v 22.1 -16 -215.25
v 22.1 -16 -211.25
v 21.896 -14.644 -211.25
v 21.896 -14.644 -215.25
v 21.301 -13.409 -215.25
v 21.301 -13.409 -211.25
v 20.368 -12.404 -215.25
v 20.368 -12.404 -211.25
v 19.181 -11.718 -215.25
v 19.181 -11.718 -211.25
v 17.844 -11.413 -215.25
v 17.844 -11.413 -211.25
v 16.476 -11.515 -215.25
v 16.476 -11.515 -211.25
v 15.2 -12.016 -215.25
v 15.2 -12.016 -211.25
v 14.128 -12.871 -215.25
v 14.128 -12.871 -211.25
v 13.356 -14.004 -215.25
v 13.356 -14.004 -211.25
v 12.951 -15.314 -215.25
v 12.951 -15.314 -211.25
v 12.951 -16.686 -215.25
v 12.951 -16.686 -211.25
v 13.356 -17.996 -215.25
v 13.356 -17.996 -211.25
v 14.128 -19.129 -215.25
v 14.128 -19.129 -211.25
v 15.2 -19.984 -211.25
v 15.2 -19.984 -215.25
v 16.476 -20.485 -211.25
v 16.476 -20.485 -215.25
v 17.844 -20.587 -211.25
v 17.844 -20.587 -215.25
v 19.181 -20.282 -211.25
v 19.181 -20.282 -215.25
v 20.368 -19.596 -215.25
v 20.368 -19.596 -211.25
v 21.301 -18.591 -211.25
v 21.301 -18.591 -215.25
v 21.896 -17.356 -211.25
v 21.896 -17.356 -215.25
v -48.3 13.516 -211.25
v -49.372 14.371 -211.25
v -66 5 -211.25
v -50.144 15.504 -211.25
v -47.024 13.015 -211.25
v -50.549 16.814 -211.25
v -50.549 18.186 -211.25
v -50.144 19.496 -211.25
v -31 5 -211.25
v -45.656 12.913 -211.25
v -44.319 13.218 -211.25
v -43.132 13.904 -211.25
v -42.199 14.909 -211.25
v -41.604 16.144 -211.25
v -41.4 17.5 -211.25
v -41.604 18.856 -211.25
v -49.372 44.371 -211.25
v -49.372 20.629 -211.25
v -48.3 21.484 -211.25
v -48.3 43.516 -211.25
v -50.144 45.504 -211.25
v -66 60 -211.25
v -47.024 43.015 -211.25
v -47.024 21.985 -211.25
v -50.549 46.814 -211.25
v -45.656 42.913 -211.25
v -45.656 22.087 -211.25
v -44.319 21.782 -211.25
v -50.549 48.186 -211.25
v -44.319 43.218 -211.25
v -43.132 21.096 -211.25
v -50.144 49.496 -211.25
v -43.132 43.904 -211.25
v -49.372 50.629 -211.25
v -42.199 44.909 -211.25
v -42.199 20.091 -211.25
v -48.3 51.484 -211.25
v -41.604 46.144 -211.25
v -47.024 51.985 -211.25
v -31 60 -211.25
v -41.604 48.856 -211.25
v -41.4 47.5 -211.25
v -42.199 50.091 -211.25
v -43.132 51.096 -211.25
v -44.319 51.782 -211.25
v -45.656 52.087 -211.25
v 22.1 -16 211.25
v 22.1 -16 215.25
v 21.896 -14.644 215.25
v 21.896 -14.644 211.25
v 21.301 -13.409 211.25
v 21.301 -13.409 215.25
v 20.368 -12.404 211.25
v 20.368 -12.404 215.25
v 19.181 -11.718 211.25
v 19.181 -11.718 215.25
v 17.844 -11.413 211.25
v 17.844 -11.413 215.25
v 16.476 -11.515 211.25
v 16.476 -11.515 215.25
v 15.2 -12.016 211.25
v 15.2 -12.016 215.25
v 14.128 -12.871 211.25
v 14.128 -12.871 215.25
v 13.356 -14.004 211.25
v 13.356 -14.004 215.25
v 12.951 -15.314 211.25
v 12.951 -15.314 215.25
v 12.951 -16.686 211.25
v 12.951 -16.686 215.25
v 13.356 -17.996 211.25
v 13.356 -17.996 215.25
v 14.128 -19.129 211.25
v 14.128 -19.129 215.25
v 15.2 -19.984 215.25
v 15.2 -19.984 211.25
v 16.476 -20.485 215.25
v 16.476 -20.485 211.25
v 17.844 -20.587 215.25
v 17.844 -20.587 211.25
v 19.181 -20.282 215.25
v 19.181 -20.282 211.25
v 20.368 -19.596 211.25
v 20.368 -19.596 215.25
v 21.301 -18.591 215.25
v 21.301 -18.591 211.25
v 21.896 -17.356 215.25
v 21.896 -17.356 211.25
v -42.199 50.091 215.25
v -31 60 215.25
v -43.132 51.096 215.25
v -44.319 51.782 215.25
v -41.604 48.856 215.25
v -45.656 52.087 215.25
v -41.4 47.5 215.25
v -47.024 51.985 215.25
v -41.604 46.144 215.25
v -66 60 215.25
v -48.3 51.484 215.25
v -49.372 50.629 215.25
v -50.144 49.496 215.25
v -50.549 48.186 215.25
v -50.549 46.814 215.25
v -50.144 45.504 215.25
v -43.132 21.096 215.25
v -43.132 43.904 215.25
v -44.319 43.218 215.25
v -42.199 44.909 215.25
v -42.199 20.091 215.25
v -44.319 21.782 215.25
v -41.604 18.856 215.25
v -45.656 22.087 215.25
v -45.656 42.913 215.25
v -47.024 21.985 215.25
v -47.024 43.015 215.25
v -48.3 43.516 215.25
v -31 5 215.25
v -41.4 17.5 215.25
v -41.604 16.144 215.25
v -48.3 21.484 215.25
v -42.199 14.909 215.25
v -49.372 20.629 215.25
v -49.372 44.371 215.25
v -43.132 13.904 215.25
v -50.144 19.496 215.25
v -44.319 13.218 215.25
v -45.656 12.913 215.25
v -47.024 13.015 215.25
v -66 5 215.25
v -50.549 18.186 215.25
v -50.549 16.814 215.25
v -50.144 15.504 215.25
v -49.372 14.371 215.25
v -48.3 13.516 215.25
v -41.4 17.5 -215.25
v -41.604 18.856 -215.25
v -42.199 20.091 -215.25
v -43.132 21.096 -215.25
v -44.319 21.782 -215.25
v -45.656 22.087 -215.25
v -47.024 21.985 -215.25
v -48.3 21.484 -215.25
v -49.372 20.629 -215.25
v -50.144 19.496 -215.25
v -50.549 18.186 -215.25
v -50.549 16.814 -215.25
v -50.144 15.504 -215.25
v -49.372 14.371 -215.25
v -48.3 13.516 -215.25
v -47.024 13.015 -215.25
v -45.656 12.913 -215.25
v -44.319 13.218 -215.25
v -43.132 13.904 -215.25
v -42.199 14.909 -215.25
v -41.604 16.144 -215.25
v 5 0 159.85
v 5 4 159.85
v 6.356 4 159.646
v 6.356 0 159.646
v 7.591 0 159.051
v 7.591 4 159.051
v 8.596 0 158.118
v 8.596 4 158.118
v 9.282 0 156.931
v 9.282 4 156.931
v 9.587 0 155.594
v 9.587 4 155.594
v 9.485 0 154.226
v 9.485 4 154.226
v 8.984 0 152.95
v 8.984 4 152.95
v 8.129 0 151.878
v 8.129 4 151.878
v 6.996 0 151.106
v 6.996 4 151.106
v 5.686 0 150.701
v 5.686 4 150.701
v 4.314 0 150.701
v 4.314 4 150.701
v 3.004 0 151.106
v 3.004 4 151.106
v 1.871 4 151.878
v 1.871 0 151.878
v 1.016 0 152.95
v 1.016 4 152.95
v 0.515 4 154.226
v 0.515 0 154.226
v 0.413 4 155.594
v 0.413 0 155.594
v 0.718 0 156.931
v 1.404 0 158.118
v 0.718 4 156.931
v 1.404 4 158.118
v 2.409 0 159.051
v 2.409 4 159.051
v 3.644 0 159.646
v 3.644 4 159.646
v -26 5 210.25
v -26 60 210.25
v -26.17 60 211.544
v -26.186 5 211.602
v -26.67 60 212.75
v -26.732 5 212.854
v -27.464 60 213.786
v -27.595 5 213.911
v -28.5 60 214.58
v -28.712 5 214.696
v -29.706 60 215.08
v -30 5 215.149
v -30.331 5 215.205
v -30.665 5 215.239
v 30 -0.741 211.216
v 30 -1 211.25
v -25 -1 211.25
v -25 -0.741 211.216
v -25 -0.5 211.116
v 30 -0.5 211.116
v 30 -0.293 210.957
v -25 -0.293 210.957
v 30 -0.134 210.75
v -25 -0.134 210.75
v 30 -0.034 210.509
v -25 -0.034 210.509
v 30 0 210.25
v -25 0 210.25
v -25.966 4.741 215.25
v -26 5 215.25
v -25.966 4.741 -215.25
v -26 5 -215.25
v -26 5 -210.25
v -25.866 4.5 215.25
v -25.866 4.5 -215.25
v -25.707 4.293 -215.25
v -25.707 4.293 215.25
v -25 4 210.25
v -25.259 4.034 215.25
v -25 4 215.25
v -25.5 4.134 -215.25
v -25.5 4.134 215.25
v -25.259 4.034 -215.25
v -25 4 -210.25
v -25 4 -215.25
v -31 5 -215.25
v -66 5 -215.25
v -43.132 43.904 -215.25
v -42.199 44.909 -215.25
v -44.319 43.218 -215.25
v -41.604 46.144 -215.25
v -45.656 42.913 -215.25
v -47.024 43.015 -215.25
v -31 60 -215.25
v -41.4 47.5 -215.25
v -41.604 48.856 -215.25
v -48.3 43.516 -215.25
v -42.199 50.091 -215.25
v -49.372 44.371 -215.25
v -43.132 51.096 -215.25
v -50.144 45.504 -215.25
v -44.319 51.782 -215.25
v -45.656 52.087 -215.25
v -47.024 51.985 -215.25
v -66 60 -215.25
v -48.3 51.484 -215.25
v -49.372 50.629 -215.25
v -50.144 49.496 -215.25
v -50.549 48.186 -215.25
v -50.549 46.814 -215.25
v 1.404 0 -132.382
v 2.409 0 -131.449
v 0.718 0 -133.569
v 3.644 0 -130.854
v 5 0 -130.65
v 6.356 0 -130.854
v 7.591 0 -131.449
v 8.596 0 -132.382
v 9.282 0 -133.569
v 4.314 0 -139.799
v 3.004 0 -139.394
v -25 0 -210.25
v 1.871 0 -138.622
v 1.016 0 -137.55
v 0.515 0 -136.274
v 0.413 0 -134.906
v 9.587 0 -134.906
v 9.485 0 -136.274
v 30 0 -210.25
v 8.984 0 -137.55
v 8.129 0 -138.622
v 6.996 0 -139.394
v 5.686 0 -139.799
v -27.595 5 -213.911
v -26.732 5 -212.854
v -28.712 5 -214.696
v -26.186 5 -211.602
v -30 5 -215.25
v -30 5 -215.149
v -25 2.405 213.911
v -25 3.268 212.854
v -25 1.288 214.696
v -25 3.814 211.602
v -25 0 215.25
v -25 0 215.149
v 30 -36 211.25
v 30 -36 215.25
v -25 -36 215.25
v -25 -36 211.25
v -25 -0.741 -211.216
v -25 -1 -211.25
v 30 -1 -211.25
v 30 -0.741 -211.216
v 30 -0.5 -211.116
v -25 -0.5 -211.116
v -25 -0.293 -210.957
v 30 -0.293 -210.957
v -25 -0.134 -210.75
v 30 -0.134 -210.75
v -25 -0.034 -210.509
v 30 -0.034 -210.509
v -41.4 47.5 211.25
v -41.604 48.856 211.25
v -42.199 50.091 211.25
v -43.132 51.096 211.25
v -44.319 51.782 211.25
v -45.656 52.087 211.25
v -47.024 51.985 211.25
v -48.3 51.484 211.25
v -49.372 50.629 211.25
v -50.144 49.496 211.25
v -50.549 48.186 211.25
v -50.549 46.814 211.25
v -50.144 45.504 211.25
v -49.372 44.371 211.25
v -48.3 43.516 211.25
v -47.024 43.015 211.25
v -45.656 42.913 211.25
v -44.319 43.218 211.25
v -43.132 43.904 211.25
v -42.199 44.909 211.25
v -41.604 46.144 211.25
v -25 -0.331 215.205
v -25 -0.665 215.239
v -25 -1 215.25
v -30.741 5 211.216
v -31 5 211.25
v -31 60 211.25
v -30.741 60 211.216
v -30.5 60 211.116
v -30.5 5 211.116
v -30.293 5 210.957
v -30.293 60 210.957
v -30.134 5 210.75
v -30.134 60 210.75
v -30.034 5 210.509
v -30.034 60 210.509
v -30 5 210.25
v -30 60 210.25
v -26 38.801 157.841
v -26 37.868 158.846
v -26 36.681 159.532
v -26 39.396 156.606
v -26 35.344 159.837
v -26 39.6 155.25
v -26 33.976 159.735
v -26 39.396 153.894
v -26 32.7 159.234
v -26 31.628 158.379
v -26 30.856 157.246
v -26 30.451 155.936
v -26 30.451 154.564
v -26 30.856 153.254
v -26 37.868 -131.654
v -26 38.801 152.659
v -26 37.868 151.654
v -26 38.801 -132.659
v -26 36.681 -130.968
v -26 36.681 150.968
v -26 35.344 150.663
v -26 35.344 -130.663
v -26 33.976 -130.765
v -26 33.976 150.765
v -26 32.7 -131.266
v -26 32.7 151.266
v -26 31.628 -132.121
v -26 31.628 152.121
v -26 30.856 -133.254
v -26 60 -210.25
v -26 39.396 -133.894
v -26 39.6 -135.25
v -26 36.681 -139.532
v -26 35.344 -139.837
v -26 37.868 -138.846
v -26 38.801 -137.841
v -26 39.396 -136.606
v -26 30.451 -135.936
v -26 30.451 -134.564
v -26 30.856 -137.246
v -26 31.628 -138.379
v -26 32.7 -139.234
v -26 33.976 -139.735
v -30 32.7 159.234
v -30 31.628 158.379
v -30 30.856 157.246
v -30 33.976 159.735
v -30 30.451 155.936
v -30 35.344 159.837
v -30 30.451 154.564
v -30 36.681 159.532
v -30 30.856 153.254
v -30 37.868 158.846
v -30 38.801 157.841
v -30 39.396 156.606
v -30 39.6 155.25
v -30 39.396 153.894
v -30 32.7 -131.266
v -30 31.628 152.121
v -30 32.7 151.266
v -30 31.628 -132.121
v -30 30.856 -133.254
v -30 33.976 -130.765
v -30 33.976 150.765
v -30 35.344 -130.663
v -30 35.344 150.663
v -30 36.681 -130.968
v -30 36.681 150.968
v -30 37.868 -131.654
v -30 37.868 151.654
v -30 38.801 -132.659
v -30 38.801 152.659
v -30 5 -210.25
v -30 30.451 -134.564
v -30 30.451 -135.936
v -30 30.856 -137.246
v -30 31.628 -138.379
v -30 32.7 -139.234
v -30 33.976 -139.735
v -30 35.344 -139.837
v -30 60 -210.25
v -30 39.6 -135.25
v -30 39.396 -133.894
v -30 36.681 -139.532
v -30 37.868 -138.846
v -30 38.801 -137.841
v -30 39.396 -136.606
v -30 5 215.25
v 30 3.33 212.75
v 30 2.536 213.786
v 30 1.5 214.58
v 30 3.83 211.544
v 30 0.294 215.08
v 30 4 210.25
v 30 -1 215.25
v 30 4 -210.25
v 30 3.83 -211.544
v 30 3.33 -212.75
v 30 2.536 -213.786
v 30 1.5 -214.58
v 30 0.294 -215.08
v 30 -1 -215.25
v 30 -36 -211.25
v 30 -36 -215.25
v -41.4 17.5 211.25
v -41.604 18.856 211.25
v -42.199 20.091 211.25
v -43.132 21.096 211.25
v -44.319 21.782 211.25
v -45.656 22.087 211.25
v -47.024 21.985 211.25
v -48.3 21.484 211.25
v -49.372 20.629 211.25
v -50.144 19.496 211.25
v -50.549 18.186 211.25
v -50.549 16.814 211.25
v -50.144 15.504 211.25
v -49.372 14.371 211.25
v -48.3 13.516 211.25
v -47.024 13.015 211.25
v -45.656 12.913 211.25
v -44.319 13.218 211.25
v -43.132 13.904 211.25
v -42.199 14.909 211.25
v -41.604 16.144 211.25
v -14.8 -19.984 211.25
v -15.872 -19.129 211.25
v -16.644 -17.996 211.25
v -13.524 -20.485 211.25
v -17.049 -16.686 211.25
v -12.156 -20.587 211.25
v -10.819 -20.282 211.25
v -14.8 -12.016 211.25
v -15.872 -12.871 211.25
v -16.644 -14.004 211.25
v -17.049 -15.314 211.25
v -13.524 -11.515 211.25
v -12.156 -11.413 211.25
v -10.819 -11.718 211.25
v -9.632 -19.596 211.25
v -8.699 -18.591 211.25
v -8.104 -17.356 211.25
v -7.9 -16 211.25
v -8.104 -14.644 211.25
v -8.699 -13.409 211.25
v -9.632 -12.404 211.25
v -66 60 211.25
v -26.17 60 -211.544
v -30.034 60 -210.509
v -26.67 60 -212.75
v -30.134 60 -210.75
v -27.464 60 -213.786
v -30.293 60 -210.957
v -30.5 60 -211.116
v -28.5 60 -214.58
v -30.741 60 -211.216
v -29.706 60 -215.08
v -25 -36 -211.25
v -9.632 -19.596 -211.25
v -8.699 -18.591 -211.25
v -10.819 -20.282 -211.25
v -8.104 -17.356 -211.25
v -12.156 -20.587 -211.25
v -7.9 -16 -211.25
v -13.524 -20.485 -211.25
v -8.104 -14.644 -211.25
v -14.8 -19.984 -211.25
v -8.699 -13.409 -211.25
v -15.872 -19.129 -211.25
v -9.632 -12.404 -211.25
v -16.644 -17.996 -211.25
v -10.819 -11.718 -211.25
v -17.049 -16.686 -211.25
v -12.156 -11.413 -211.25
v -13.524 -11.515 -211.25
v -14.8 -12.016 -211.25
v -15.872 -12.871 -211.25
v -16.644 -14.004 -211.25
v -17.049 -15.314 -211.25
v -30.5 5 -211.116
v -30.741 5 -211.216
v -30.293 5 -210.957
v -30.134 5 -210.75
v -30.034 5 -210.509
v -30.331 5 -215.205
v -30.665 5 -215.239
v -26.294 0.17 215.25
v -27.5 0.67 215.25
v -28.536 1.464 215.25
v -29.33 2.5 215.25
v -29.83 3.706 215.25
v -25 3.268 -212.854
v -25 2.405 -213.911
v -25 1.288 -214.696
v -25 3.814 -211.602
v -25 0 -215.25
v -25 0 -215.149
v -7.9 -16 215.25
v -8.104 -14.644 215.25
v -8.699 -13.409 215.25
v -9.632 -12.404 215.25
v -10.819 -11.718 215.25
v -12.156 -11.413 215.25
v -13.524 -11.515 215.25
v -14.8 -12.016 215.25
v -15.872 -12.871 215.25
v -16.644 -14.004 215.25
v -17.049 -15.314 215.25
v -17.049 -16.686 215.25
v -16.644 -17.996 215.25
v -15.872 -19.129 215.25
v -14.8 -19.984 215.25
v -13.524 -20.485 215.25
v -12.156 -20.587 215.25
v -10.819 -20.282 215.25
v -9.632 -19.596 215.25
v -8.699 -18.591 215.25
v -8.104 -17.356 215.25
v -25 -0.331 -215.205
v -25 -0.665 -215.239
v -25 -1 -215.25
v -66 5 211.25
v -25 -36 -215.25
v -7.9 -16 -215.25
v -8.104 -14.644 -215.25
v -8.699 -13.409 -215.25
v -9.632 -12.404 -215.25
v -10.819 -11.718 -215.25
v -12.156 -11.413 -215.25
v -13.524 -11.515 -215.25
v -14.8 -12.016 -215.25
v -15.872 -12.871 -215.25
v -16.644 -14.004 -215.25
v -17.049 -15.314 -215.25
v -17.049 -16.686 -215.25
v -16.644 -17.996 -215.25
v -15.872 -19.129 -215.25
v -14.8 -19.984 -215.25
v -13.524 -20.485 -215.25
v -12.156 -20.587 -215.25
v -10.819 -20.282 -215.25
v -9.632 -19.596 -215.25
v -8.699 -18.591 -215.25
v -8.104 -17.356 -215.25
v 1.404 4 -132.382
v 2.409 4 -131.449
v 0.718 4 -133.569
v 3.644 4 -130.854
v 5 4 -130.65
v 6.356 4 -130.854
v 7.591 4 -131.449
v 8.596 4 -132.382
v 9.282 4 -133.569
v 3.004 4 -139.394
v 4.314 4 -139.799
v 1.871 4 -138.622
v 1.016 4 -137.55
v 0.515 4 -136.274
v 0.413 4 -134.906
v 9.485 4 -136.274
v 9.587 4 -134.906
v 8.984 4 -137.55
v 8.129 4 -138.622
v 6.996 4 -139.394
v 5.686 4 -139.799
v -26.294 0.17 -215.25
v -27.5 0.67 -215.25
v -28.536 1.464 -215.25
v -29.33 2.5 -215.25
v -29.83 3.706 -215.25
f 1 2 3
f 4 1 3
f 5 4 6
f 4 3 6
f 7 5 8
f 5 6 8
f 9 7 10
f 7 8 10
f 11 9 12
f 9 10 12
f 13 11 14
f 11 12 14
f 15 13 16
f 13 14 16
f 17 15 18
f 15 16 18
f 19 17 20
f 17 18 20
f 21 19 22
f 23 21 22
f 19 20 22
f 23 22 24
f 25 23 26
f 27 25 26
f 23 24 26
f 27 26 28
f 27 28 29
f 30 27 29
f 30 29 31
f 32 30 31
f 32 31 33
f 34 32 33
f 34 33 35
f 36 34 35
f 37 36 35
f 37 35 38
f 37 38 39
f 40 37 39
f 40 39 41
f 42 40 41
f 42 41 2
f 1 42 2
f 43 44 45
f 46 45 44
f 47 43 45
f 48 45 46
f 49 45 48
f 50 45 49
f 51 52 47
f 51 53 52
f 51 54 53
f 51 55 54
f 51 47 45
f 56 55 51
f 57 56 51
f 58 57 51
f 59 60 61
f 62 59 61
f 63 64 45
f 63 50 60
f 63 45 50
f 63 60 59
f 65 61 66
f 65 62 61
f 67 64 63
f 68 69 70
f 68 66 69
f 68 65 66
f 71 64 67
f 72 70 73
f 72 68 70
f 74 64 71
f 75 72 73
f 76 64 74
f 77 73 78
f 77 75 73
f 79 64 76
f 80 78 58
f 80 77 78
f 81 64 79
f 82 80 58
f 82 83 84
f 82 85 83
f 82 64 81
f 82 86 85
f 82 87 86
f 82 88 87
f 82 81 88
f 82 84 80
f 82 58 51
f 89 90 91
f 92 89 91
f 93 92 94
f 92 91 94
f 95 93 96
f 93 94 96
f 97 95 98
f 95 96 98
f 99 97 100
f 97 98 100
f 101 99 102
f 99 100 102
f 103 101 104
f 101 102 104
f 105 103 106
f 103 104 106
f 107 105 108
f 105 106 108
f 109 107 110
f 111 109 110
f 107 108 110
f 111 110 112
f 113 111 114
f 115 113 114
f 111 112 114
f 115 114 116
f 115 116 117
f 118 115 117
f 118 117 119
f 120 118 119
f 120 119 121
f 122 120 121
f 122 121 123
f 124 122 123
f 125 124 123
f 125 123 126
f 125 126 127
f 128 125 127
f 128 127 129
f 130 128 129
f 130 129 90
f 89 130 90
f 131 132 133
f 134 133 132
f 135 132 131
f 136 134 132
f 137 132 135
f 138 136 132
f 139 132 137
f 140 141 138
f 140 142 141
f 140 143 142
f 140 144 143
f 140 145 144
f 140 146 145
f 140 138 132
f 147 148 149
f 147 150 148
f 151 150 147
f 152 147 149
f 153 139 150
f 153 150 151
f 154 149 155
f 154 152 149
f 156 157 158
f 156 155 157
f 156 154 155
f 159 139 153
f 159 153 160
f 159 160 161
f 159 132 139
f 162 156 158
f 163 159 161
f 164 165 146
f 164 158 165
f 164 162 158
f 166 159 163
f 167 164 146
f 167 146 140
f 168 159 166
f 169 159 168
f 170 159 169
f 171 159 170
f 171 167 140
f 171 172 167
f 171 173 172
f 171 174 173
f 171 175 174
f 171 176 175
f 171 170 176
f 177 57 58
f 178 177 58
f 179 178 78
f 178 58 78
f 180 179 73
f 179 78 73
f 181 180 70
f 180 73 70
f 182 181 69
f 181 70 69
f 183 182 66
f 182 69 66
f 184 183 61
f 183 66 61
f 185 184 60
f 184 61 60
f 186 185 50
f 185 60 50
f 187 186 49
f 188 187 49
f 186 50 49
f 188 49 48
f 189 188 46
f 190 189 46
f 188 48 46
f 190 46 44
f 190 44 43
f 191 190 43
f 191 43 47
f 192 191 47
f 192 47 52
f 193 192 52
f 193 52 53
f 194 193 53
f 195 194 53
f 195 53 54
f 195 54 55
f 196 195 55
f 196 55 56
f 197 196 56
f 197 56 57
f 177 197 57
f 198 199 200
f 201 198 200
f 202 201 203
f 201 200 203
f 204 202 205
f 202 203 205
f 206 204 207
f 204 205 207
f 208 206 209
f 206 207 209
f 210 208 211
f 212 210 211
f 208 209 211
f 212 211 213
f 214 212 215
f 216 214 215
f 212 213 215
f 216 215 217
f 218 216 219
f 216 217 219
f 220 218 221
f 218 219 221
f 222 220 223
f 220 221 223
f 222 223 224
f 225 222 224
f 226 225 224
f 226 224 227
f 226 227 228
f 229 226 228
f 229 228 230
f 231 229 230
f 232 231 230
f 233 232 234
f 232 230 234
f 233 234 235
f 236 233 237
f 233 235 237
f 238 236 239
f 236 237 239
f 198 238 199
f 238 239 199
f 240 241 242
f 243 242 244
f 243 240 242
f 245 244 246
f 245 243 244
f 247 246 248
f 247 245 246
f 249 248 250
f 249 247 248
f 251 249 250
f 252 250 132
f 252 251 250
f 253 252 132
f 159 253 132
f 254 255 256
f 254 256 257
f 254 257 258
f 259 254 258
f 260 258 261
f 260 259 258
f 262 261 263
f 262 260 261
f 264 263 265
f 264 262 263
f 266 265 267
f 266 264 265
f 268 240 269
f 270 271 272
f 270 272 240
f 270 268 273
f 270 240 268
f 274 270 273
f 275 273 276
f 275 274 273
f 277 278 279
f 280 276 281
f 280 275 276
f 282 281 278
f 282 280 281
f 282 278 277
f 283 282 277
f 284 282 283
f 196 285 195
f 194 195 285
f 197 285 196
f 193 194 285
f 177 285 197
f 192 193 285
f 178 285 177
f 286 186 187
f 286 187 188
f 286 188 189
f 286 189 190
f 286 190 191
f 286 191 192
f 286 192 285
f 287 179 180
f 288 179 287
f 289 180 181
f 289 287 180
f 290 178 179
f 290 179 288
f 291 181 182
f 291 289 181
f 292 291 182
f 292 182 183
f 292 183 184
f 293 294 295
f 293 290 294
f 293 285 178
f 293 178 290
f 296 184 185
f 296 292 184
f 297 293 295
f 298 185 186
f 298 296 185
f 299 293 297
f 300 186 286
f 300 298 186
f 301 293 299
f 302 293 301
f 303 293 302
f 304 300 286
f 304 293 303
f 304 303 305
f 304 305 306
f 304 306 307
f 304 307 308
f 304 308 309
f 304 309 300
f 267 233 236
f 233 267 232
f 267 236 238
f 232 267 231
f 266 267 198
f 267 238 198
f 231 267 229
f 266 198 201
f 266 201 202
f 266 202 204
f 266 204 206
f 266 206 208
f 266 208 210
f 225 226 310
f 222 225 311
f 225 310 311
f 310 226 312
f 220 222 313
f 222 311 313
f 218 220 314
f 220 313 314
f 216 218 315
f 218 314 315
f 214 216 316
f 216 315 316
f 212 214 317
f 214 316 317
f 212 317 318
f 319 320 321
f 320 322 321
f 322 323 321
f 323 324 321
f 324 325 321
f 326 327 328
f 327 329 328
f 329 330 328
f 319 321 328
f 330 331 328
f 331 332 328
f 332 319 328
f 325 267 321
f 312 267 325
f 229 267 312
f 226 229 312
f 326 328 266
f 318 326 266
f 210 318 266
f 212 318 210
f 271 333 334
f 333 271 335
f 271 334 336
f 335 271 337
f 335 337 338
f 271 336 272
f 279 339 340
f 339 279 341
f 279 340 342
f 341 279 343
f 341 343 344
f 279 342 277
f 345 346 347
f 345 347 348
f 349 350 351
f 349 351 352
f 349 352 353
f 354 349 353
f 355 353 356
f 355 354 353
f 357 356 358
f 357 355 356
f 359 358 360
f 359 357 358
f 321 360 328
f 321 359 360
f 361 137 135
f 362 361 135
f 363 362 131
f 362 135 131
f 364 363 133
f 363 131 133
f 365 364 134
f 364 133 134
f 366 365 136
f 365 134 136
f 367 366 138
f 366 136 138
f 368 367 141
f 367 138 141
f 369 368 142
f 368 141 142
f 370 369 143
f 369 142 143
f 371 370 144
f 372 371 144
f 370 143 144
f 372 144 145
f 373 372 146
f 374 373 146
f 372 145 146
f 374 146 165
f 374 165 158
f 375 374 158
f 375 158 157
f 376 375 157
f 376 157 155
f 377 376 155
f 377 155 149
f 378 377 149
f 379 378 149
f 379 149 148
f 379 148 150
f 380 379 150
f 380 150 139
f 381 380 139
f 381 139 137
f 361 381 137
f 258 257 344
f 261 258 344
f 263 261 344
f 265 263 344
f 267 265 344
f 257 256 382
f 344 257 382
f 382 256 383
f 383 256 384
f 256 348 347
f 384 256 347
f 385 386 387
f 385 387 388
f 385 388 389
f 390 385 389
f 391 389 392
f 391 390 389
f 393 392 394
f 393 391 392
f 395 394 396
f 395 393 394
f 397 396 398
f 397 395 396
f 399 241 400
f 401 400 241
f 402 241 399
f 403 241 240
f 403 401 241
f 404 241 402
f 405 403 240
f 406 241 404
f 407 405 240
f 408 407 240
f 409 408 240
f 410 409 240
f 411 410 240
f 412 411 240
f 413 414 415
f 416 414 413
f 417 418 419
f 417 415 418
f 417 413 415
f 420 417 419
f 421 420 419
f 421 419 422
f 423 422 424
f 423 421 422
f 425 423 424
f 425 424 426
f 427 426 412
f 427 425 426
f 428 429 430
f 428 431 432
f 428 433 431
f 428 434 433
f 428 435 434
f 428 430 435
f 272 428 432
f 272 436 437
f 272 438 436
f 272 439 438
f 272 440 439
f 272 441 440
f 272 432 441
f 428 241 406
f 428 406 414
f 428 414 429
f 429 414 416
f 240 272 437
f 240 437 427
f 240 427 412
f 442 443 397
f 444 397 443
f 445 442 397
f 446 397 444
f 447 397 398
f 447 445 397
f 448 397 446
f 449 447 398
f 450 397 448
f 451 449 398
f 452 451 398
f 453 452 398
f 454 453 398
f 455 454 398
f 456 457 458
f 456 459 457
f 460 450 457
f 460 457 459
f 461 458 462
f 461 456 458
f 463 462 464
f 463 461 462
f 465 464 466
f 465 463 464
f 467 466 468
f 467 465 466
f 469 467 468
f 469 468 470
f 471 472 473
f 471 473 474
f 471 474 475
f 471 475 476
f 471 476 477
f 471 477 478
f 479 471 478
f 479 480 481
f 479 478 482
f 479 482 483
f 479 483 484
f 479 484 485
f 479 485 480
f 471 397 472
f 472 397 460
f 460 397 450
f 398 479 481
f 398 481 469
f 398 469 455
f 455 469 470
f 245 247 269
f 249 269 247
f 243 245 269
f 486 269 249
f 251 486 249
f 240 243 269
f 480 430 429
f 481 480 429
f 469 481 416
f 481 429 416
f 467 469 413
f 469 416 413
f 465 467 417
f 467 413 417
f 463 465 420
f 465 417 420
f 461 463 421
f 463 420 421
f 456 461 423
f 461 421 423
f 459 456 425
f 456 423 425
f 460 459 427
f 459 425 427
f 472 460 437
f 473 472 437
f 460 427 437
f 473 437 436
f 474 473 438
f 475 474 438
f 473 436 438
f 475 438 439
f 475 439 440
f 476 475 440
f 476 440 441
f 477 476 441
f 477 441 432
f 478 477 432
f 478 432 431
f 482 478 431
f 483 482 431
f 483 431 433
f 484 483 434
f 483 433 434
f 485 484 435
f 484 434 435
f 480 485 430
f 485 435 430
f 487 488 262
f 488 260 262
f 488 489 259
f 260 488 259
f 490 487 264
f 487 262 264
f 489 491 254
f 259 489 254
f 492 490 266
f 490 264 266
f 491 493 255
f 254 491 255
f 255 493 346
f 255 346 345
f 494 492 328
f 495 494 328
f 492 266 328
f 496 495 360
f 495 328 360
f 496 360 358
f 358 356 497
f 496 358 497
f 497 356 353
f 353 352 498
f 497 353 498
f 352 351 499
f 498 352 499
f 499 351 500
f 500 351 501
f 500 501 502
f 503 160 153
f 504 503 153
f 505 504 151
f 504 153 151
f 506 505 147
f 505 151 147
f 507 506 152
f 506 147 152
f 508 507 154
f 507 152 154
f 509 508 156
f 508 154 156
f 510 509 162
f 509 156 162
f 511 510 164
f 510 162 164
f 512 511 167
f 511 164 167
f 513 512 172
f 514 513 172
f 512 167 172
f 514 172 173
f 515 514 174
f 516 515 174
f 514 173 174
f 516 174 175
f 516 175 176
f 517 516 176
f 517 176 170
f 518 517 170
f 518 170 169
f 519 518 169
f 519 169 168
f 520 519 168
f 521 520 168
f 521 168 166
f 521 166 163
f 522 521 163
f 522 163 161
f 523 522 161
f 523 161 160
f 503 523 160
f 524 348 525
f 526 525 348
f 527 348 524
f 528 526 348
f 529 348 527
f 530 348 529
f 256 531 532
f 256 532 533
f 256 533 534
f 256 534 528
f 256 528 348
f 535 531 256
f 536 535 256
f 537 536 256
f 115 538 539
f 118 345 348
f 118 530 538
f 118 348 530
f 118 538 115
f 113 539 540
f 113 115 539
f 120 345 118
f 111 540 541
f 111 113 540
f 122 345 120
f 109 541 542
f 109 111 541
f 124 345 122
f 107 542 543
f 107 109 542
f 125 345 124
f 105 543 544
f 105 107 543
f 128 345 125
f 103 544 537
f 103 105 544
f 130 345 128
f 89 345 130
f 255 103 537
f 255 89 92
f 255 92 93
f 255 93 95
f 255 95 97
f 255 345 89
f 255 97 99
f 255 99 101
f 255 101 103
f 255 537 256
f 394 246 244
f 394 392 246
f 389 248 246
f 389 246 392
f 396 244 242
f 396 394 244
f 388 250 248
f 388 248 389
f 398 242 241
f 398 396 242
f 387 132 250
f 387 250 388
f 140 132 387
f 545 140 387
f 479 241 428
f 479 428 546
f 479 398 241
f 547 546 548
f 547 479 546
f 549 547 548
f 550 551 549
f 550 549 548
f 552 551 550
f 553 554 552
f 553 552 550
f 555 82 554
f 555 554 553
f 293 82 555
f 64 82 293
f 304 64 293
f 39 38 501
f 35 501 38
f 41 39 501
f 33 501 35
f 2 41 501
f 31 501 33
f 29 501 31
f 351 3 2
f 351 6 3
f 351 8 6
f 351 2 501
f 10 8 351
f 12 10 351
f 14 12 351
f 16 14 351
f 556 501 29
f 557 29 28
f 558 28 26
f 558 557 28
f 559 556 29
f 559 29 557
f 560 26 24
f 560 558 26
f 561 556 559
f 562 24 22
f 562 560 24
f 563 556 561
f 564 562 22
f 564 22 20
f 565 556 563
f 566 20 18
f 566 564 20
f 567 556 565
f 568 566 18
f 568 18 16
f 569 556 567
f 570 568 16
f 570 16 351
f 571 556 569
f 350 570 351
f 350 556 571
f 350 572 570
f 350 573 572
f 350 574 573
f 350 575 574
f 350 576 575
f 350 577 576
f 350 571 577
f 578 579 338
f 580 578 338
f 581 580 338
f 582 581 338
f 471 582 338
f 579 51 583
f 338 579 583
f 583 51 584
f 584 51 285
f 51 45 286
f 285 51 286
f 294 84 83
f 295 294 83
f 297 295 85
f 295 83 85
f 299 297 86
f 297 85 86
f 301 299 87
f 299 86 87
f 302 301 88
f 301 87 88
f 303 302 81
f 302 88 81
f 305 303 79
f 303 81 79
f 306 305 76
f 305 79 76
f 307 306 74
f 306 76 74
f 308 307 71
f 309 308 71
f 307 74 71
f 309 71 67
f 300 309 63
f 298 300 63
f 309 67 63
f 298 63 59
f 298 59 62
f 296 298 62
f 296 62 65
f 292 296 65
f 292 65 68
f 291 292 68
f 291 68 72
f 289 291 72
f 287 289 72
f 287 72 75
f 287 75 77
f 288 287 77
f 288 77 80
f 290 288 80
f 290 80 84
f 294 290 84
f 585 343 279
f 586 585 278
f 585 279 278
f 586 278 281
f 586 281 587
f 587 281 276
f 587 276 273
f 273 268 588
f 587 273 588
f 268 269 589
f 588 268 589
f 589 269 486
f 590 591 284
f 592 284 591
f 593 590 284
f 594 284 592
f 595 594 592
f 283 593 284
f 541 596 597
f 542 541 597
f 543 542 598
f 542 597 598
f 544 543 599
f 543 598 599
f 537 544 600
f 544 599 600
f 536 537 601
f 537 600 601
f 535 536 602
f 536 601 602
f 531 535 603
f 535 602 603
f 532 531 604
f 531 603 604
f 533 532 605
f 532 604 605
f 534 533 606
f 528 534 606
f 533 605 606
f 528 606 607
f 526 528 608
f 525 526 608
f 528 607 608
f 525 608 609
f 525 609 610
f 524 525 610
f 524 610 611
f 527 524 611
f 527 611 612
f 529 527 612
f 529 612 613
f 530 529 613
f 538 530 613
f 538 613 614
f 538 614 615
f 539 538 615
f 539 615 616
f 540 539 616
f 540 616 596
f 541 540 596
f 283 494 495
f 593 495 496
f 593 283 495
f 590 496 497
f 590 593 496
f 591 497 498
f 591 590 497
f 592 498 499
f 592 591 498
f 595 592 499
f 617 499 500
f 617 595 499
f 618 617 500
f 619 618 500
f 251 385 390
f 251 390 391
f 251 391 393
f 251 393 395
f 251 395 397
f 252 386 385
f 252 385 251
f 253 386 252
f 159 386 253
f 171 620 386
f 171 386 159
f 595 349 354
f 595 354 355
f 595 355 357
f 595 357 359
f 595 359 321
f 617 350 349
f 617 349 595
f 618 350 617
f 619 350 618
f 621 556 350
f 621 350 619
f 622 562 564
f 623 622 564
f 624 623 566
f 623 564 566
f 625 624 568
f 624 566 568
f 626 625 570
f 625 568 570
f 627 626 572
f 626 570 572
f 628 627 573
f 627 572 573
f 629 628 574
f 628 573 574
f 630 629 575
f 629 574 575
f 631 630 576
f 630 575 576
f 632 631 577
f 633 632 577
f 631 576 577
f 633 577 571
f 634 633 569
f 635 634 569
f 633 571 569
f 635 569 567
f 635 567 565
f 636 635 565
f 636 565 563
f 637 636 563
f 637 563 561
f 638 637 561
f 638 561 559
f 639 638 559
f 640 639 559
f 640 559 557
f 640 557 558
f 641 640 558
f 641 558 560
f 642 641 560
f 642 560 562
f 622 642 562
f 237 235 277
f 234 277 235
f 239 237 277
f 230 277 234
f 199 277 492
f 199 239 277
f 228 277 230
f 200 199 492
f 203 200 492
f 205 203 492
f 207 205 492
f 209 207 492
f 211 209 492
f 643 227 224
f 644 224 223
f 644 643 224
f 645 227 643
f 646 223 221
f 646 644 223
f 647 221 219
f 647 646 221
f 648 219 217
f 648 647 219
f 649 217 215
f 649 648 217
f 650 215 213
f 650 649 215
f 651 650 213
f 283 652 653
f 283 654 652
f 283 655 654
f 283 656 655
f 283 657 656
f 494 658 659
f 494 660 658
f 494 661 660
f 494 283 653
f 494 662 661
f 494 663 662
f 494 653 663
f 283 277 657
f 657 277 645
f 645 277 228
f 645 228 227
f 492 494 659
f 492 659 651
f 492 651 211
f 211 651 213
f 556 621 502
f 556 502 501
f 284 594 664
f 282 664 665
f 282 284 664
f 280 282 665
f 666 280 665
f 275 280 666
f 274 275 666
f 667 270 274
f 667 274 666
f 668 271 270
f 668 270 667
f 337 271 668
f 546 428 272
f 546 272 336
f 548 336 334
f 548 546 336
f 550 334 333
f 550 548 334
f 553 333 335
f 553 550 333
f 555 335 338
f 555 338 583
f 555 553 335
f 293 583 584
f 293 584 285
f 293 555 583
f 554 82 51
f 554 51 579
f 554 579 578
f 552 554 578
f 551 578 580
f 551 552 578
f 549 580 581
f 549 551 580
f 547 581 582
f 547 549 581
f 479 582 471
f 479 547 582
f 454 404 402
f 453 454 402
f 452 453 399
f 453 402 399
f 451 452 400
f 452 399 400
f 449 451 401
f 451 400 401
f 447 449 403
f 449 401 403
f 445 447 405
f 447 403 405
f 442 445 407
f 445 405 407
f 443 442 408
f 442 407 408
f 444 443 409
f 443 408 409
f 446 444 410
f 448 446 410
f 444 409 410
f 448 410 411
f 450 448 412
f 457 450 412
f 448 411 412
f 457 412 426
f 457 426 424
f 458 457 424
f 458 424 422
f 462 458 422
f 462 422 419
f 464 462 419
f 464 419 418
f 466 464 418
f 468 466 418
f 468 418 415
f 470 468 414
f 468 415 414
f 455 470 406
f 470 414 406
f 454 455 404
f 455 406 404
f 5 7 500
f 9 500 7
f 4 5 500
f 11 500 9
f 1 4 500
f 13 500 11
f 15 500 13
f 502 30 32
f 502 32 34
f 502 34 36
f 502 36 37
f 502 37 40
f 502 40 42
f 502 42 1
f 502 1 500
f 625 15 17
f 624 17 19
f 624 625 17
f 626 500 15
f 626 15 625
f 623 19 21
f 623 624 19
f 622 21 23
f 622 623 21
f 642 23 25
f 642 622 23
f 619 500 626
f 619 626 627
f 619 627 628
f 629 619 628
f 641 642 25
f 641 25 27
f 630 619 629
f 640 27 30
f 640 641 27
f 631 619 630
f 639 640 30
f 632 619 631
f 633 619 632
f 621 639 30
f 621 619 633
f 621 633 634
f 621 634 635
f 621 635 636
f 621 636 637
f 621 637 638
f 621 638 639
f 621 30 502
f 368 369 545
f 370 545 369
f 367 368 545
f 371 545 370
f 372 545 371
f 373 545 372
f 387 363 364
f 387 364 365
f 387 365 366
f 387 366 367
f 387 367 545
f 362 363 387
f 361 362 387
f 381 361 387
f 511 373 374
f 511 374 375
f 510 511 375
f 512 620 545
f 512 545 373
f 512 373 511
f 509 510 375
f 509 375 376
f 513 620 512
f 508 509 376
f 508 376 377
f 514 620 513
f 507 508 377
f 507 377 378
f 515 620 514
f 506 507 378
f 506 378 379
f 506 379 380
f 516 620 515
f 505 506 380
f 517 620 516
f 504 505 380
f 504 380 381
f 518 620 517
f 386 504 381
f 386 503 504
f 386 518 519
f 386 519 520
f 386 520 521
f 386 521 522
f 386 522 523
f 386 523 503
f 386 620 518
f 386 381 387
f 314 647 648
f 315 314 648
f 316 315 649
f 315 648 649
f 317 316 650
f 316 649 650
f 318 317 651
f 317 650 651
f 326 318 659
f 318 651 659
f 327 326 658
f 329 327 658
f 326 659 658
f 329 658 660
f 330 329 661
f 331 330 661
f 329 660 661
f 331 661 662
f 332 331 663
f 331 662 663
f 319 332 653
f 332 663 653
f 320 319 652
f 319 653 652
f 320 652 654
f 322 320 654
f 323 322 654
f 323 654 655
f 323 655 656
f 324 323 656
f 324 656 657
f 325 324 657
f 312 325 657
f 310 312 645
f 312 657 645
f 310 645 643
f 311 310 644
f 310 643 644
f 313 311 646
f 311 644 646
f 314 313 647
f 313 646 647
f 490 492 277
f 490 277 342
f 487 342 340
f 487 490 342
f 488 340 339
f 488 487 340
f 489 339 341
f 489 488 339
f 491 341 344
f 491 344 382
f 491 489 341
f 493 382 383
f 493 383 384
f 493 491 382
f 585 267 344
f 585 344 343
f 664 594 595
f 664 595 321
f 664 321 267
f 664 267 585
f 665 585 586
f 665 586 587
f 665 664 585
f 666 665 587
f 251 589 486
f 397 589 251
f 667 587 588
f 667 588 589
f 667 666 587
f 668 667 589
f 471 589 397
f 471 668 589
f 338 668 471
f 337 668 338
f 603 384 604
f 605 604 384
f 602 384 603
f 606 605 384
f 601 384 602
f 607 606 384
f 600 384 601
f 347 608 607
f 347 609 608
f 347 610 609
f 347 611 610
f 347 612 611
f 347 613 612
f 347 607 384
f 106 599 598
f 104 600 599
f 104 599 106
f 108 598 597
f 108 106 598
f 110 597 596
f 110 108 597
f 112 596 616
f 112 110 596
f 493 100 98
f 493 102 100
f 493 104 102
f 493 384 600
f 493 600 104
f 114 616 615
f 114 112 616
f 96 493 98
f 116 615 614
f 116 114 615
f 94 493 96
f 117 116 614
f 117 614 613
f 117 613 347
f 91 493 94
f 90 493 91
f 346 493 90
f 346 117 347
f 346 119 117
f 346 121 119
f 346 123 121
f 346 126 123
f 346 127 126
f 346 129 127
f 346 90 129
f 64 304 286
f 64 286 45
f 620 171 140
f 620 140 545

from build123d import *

# Parameters (mm, degrees)
SKETCH1_W                      = 60
SKETCH1_H                      = 430.5
BASE_FLANGE1_DEPTH             = 4
EDGE_FLANGE1_STRIP_W           = 18
EDGE_FLANGE1_STRIP_H           = 4
EDGE_FLANGE1_STRIP_CUT_DEPTH   = 430.5
EDGE_FLANGE1_DEPTH             = 430.5
EDGE_FLANGE2_STRIP_W           = 18
EDGE_FLANGE2_STRIP_H           = 4
EDGE_FLANGE2_STRIP_CUT_DEPTH   = 55
EDGE_FLANGE2_STRIP_2_W         = 18
EDGE_FLANGE2_STRIP_2_H         = 4
EDGE_FLANGE2_STRIP_CUT_2_DEPTH = 55
EDGE_FLANGE2_STRIP_3_W         = 18
EDGE_FLANGE2_STRIP_3_H         = 4
EDGE_FLANGE2_STRIP_CUT_3_DEPTH = 55
EDGE_FLANGE2_STRIP_4_W         = 18
EDGE_FLANGE2_STRIP_4_H         = 4
EDGE_FLANGE2_STRIP_CUT_4_DEPTH = 55
EDGE_FLANGE2_DEPTH             = 55
EDGE_FLANGE2_BEND_DEPTH        = 55
EDGE_FLANGE2_BEND_2_DEPTH      = 55
EDGE_FLANGE2_BEND_3_DEPTH      = 55
SKETCH18_R                     = 4.6
EXTRUDE1_DEPTH                 = 440.643321341
SKETCH19_R                     = 4.6
EXTRUDE2_DEPTH                 = 4
SKETCH20_R                     = 4.6
EXTRUDE3_DEPTH                 = 4


# Sheet-metal steps are written as plain solids
with BuildPart() as part:
    # Sketch1 → Base-Flange1 (new body)
    with BuildSketch(Plane(origin=(0, 0, 0), x_dir=(1, 0, 0), z_dir=(0, 1, 0))):
        Rectangle(SKETCH1_W, SKETCH1_H)
    extrude(amount=BASE_FLANGE1_DEPTH)

    # Edge-Flange1 strip (across the edge) → Edge-Flange1 strip cut (cut)
    with BuildSketch(Plane(origin=(-30, 4, -215.25), x_dir=(1, 0, 0), z_dir=(0, 0, 1))):
        with Locations((-4, -2)):
            Rectangle(EDGE_FLANGE1_STRIP_W, EDGE_FLANGE1_STRIP_H)
    extrude(amount=EDGE_FLANGE1_STRIP_CUT_DEPTH, mode=Mode.SUBTRACT)

    # Edge-Flange1 section (across the edge) → Edge-Flange1 (add)
    with BuildSketch(Plane(origin=(-30, 4, -215.25), x_dir=(1, 0, 0), z_dir=(0, 0, 1))):
        with BuildLine():
            Line((0, 1), (0, 56))
            Line((0, 56), (4, 56))
            Line((4, 56), (4, 1))
            ThreePointArc((4, 1), (4.292893219, 0.292893219), (5, 0))
            Line((5, 0), (5, -4))
            ThreePointArc((5, -4), (1.464466094, -2.535533906), (0, 1))
        make_face()
    extrude(amount=EDGE_FLANGE1_DEPTH)

    # Edge-Flange2 strip (across the edge) → Edge-Flange2 strip cut (cut)
    with BuildSketch(Plane(origin=(-30, 5, 215.25), x_dir=(0, 0, -1), z_dir=(0, 1, 0))):
        with Locations((-4, -2)):
            Rectangle(EDGE_FLANGE2_STRIP_W, EDGE_FLANGE2_STRIP_H)
    extrude(amount=EDGE_FLANGE2_STRIP_CUT_DEPTH, mode=Mode.SUBTRACT)

    # Edge-Flange2 strip 2 (across the edge) → Edge-Flange2 strip cut 2 (cut)
    with BuildSketch(Plane(origin=(30, 0, 215.25), x_dir=(0, 0, -1), z_dir=(-1, 0, 0))):
        with Locations((-4, -2)):
            Rectangle(EDGE_FLANGE2_STRIP_2_W, EDGE_FLANGE2_STRIP_2_H)
    extrude(amount=EDGE_FLANGE2_STRIP_CUT_2_DEPTH, mode=Mode.SUBTRACT)

    # Edge-Flange2 strip 3 (across the edge) → Edge-Flange2 strip cut 3 (cut)
    with BuildSketch(Plane(origin=(-30, 60, -215.25), x_dir=(0, 0, 1), z_dir=(0, -1, 0))):
        with Locations((-4, -2)):
            Rectangle(EDGE_FLANGE2_STRIP_3_W, EDGE_FLANGE2_STRIP_3_H)
    extrude(amount=EDGE_FLANGE2_STRIP_CUT_3_DEPTH, mode=Mode.SUBTRACT)

    # Edge-Flange2 strip 4 (across the edge) → Edge-Flange2 strip cut 4 (cut)
    with BuildSketch(Plane(origin=(-25, 0, -215.25), x_dir=(0, 0, 1), z_dir=(1, 0, 0))):
        with Locations((-4, -2)):
            Rectangle(EDGE_FLANGE2_STRIP_4_W, EDGE_FLANGE2_STRIP_4_H)
    extrude(amount=EDGE_FLANGE2_STRIP_CUT_4_DEPTH, mode=Mode.SUBTRACT)

    # Edge-Flange2 section (across the edge) → Edge-Flange2 (add)
    with BuildSketch(Plane(origin=(-30, 5, 215.25), x_dir=(0, 0, -1), z_dir=(0, 1, 0))):
        with BuildLine():
            Line((0, 1), (0, 36))
            Line((0, 36), (4, 36))
            Line((4, 36), (4, 1))
            ThreePointArc((4, 1), (4.292893219, 0.292893219), (5, 0))
            Line((5, 0), (5, -4))
            ThreePointArc((5, -4), (1.464466094, -2.535533906), (0, 1))
        make_face()
    extrude(amount=EDGE_FLANGE2_DEPTH)

    # Edge-Flange2 section 2 (across the edge) → Edge-Flange2 bend (add)
    with BuildSketch(Plane(origin=(30, 0, 215.25), x_dir=(0, 0, -1), z_dir=(-1, 0, 0))):
        with BuildLine():
            Line((0, 1), (0, 36))
            Line((0, 36), (4, 36))
            Line((4, 36), (4, 1))
            ThreePointArc((4, 1), (4.292893219, 0.292893219), (5, 0))
            Line((5, 0), (5, -4))
            ThreePointArc((5, -4), (1.464466094, -2.535533906), (0, 1))
        make_face()
    extrude(amount=EDGE_FLANGE2_BEND_DEPTH)

    # Edge-Flange2 section 3 (across the edge) → Edge-Flange2 bend 2 (add)
    with BuildSketch(Plane(origin=(-30, 60, -215.25), x_dir=(0, 0, 1), z_dir=(0, -1, 0))):
        with BuildLine():
            Line((0, 1), (0, 36))
            Line((0, 36), (4, 36))
            Line((4, 36), (4, 1))
            ThreePointArc((4, 1), (4.292893219, 0.292893219), (5, 0))
            Line((5, 0), (5, -4))
            ThreePointArc((5, -4), (1.464466094, -2.535533906), (0, 1))
        make_face()
    extrude(amount=EDGE_FLANGE2_BEND_2_DEPTH)

    # Edge-Flange2 section 4 (across the edge) → Edge-Flange2 bend 3 (add)
    with BuildSketch(Plane(origin=(-25, 0, -215.25), x_dir=(0, 0, 1), z_dir=(1, 0, 0))):
        with BuildLine():
            Line((0, 1), (0, 36))
            Line((0, 36), (4, 36))
            Line((4, 36), (4, 1))
            ThreePointArc((4, 1), (4.292893219, 0.292893219), (5, 0))
            Line((5, 0), (5, -4))
            ThreePointArc((5, -4), (1.464466094, -2.535533906), (0, 1))
        make_face()
    extrude(amount=EDGE_FLANGE2_BEND_3_DEPTH)

    # Sketch18 → Extrude1 (cut, through all)
    with BuildSketch(Plane.XY.offset(215.25)):
        with Locations((-46, 47.5)):
            Circle(SKETCH18_R)
        with Locations((-46, 17.5)):
            Circle(SKETCH18_R)
        with Locations((-12.5, -16)):
            Circle(SKETCH18_R)
        with Locations((17.5, -16)):
            Circle(SKETCH18_R)
    extrude(amount=-EXTRUDE1_DEPTH, mode=Mode.SUBTRACT)

    # Sketch19 → Extrude2 (cut)
    with BuildSketch(Plane(origin=(-26, 0, 0), x_dir=(0, 0, -1), z_dir=(1, 0, 0))):
        with Locations(Location((-155.25, 35, 0), (0, 0, 90))):
            Circle(SKETCH19_R)
        with Locations(Location((135.25, 35, 0), (0, 0, 90))):
            Circle(SKETCH19_R)
    extrude(amount=-EXTRUDE2_DEPTH, mode=Mode.SUBTRACT)

    # Sketch20 → Extrude3 (cut)
    with BuildSketch(Plane(origin=(0, 4, 0), x_dir=(1, 0, 0), z_dir=(0, 1, 0))):
        with Locations(Location((5, 135.25, 0), (0, 0, 270))):
            Circle(SKETCH20_R)
        with Locations(Location((5, -155.25, 0), (0, 0, 270))):
            Circle(SKETCH20_R)
    extrude(amount=-EXTRUDE3_DEPTH, mode=Mode.SUBTRACT)


solid = part.part
